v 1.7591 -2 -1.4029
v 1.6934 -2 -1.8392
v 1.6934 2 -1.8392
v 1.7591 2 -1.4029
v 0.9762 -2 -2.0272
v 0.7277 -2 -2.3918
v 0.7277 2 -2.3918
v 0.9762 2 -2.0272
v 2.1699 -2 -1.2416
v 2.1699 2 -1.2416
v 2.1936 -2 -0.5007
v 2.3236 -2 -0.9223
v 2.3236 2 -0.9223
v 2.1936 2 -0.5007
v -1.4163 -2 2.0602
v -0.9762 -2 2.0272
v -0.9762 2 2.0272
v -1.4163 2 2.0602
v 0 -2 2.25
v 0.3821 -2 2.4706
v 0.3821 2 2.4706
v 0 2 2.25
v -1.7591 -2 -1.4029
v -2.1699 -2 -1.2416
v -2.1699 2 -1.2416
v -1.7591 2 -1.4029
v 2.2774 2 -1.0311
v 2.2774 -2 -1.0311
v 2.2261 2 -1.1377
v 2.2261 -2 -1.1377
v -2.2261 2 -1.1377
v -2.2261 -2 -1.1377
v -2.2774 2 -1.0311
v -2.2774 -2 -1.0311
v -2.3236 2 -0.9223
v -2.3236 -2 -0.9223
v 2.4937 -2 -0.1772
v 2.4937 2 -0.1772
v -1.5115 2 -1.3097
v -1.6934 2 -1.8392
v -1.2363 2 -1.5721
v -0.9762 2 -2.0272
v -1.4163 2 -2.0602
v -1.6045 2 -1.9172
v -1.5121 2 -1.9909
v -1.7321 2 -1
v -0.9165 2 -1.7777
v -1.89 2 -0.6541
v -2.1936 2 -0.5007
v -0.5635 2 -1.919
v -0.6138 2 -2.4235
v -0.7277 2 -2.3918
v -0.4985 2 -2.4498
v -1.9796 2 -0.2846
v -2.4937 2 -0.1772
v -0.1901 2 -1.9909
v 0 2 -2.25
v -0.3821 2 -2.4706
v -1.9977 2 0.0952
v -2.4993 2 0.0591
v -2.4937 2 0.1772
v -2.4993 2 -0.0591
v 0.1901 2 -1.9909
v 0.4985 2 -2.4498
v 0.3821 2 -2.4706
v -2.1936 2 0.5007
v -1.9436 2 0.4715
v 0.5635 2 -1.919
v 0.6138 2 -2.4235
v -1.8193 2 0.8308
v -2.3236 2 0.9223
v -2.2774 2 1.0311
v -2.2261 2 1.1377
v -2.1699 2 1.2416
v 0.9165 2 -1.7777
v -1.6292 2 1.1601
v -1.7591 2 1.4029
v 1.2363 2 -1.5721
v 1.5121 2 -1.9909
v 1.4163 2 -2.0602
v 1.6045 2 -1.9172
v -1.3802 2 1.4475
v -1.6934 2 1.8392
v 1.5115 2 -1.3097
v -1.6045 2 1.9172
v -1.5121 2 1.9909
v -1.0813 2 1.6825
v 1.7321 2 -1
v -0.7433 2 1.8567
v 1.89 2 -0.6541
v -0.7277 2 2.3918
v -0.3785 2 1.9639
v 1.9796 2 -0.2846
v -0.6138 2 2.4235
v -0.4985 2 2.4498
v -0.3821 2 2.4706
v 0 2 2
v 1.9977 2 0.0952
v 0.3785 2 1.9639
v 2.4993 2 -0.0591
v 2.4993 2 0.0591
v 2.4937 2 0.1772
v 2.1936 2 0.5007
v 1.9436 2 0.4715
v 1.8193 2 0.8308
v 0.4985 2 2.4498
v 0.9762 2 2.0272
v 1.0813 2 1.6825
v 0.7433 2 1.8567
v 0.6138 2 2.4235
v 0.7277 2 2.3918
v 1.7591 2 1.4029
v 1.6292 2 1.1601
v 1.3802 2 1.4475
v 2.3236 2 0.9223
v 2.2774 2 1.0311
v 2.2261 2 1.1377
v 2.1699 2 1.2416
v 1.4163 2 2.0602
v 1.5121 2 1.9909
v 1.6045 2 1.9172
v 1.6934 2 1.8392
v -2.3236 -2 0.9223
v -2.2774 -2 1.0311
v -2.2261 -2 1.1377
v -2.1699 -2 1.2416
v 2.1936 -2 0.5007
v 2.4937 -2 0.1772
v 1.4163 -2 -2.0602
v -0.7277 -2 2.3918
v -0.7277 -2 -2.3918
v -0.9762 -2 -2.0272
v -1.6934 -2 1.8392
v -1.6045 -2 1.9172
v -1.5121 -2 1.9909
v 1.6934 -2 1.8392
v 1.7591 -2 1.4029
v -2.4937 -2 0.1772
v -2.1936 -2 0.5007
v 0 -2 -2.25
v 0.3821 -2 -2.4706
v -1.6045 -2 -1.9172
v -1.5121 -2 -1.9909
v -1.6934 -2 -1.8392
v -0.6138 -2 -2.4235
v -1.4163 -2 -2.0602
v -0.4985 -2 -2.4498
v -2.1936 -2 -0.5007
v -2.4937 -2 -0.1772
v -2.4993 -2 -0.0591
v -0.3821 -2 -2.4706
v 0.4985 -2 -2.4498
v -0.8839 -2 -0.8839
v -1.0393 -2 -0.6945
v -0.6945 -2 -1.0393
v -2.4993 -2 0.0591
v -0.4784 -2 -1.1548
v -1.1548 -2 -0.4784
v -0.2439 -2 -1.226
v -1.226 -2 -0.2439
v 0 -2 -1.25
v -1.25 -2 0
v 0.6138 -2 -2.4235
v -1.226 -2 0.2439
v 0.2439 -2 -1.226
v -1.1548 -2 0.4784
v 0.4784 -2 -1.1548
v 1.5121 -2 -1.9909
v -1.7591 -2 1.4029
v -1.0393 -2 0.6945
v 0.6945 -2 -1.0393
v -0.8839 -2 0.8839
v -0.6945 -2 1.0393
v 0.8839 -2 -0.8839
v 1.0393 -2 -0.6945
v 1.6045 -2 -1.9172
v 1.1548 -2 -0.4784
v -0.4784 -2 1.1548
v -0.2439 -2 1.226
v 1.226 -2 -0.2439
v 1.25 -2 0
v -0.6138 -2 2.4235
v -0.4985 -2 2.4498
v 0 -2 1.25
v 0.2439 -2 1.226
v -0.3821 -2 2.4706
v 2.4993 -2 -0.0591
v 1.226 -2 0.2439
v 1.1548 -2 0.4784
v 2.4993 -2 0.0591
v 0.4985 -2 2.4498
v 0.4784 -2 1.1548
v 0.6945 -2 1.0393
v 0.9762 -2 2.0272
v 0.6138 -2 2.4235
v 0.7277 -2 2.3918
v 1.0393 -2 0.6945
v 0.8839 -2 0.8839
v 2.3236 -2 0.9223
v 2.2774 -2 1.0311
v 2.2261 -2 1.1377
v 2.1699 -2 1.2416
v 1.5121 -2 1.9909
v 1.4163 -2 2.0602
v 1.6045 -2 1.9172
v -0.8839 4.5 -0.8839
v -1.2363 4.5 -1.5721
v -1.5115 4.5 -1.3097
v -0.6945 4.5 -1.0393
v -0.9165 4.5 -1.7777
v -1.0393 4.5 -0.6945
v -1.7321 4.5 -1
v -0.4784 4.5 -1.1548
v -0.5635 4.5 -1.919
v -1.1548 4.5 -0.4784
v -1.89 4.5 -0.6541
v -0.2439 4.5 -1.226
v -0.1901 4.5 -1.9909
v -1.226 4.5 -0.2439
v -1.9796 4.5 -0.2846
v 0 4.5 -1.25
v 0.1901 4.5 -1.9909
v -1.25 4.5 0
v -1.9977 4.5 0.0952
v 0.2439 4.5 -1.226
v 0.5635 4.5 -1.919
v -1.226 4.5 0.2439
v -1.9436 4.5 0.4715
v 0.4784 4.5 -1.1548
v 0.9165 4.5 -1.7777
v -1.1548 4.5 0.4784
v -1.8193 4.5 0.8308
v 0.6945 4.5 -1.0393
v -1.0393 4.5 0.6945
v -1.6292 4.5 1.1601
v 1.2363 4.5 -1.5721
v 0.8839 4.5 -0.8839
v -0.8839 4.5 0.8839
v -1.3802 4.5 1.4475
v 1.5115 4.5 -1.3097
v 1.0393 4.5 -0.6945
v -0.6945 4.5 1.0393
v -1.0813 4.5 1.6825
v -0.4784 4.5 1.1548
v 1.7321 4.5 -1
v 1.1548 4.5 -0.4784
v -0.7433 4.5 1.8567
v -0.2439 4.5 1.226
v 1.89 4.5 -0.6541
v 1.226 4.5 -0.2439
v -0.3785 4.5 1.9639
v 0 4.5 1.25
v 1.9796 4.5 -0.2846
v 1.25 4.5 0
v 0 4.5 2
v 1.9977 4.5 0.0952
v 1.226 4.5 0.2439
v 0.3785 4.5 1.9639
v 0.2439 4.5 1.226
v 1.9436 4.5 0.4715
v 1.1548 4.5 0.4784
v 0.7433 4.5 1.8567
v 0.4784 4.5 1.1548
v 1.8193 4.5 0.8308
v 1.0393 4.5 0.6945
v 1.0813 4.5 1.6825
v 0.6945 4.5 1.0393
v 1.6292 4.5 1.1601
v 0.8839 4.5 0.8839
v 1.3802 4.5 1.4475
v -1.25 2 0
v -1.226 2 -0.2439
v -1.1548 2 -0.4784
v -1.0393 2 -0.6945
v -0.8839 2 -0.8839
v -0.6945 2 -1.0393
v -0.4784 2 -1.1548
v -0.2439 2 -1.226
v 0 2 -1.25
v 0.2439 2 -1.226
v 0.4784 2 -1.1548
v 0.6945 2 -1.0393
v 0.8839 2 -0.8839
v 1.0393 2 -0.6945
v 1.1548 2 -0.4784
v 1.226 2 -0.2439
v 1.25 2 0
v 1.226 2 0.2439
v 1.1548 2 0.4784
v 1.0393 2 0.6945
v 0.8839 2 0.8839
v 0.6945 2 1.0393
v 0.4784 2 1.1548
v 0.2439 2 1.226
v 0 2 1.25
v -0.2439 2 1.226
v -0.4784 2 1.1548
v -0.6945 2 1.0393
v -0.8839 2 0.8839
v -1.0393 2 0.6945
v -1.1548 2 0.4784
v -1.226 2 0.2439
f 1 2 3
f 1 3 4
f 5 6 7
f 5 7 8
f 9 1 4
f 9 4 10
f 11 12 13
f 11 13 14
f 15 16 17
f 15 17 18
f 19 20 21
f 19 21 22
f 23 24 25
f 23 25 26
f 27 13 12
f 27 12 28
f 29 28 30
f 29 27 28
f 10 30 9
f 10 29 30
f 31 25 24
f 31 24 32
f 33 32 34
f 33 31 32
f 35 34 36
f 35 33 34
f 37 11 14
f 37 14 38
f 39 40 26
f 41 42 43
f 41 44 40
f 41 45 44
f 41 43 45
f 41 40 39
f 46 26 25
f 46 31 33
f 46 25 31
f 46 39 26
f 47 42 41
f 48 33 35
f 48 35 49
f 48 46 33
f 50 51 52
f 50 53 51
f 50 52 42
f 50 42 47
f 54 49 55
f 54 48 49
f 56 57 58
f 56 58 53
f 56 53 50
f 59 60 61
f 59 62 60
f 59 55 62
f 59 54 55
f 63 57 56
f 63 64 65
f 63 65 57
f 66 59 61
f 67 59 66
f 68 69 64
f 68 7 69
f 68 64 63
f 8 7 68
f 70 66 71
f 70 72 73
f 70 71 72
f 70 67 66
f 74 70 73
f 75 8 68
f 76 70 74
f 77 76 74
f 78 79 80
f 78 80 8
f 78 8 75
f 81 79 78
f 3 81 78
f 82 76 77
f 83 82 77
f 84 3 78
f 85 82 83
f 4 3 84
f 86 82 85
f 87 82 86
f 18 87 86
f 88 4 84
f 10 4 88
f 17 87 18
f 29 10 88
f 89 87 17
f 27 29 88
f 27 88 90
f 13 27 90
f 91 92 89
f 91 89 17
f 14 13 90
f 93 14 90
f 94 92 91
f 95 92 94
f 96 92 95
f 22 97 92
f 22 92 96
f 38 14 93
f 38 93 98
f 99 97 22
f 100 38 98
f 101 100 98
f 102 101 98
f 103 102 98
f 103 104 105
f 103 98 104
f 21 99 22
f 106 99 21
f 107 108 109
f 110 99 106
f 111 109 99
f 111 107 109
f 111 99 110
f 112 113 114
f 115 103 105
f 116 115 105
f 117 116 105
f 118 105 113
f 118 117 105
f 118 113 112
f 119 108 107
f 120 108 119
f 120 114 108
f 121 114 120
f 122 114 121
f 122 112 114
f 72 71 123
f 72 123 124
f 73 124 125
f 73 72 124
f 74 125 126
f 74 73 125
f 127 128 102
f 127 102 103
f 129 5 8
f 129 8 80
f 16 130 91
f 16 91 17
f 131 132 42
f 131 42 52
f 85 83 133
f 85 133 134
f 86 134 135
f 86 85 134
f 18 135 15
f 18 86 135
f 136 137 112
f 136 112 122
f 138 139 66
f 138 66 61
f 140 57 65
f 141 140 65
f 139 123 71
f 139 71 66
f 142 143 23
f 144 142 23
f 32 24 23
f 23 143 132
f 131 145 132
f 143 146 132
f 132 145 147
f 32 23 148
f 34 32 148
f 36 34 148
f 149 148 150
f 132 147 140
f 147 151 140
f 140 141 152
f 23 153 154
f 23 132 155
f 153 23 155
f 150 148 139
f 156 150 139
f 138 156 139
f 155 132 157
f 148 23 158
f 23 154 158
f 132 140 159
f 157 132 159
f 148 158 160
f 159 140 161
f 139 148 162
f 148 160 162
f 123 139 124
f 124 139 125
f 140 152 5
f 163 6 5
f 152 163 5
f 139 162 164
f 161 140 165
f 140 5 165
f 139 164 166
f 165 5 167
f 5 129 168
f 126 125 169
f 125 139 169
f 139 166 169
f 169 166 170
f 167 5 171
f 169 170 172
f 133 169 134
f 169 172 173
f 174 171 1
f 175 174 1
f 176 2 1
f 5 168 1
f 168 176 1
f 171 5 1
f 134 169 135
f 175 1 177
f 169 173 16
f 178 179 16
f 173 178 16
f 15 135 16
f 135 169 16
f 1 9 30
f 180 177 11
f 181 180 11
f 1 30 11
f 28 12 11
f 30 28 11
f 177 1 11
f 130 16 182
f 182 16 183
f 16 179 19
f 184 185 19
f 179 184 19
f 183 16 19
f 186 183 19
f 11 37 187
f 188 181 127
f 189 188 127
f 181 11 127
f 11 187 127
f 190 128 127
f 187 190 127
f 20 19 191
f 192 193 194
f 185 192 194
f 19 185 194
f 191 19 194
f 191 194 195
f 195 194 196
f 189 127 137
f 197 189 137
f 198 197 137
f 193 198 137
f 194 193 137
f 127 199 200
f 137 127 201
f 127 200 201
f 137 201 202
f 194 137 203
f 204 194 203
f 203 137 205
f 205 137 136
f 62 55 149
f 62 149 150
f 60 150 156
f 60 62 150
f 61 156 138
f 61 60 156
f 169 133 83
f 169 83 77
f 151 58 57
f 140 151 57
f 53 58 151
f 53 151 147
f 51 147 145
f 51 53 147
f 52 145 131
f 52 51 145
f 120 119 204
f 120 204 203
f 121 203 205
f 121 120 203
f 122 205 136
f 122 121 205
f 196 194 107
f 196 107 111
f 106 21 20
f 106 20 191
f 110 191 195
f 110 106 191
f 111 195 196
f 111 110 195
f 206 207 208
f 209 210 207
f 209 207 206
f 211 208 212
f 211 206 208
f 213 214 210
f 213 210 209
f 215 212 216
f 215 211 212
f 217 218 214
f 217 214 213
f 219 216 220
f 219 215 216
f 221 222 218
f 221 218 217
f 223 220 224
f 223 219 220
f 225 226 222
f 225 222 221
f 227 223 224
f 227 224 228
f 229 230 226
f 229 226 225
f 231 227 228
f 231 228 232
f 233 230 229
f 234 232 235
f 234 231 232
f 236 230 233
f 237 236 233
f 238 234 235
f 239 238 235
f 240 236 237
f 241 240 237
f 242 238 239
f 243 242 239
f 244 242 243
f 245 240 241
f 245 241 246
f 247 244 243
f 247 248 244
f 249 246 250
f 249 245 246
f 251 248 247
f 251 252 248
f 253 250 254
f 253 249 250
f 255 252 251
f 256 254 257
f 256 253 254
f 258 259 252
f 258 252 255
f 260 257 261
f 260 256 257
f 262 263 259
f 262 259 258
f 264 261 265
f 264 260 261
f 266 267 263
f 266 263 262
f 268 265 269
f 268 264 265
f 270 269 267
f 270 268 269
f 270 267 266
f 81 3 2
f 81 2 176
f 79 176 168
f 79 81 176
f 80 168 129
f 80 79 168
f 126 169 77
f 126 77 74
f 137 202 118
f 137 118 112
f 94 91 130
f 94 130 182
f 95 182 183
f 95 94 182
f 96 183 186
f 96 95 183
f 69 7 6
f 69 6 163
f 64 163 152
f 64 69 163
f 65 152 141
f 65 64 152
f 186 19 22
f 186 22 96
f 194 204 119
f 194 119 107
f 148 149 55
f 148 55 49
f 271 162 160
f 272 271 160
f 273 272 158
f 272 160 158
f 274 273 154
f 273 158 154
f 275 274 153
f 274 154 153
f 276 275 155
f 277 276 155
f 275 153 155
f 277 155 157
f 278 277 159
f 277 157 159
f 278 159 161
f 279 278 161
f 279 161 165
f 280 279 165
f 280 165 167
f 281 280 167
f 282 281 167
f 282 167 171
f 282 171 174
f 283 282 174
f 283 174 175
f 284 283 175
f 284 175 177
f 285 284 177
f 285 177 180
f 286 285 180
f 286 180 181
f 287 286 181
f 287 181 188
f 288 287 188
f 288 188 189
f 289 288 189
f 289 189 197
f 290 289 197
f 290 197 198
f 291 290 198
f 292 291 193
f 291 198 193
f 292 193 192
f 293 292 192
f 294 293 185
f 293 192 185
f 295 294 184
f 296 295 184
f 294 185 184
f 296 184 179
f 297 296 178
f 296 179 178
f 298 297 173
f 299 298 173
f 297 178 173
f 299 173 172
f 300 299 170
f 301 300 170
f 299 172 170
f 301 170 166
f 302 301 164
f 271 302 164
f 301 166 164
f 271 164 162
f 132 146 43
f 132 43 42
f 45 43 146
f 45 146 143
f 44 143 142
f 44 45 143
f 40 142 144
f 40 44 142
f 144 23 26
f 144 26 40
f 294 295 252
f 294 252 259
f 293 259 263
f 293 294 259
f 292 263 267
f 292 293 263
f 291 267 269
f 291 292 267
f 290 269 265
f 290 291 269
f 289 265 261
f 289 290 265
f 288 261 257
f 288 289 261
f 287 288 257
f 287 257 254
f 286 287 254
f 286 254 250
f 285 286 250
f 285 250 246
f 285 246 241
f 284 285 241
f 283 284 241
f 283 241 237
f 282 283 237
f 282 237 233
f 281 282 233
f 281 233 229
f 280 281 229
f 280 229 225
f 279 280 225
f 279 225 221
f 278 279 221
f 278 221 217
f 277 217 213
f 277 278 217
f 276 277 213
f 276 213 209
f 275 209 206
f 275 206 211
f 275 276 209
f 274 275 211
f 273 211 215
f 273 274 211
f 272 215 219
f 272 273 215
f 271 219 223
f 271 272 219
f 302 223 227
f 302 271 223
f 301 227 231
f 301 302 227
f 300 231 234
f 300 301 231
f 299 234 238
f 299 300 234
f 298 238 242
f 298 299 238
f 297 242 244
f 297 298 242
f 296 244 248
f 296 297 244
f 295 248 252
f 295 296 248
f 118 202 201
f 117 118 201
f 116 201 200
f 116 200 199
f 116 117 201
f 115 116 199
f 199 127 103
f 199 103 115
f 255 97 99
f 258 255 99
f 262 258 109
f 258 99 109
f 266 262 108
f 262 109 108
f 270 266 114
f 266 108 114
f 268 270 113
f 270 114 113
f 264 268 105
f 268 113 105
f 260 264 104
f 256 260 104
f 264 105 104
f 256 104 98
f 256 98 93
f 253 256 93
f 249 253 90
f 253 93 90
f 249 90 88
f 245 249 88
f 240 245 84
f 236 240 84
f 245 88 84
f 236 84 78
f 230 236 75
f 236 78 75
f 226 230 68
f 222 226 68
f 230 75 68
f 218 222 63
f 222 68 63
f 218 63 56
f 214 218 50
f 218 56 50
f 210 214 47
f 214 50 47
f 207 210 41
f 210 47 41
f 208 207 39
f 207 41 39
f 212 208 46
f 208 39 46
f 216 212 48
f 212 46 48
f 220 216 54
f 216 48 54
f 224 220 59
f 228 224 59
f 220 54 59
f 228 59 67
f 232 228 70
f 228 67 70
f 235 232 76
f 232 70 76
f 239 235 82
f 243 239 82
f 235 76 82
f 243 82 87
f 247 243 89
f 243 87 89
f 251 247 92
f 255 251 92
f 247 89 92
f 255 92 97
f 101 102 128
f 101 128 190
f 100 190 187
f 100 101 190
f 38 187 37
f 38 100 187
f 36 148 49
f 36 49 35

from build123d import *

# Parameters (mm, degrees)
MAINBODYS_R           = 2.5
MAIN_BODY_DEPTH       = 2
M3X0_5_TAPPED_HOLE1_D = 2.5
GROOVED_CUT_DEPTH     = 6.338539126
GC_START              = -2
GC_CP_DEPTH           = 4
PRESSFITBODYS_R       = 2
PRESSFITBODYS_R_2     = 1.25
PRESS_FIT_BODY_DEPTH  = 2.5


# Read off the part's stored shape, not the designer's step: GC CP
with BuildPart() as part:
    # MainBodyS → MAIN BODY (new, symmetric)
    with BuildSketch(Plane(origin=(0, 0, 0), x_dir=(1, 0, 0), z_dir=(0, 1, 0))):
        with Locations(Location((0, 0, 0), (0, 0, 270))):
            Circle(MAINBODYS_R)
    extrude(amount=MAIN_BODY_DEPTH, both=True)

    # M3x0.5 Tapped Hole1 (through all)
    with Locations(Plane(origin=(0, 2, 0), x_dir=(1, 0, 0), z_dir=(0, 1, 0))):
        with Locations((0, 0)):
            Hole(M3X0_5_TAPPED_HOLE1_D / 2)

    # GroovedCutS → GROOVED CUT (cut, through all)
    with BuildSketch(Plane(origin=(0, 2, 0), x_dir=(1, 0, 0), z_dir=(0, 1, 0))):
        with BuildLine():
            Line((0, 2.25), (0.382129822, 2.470622755))
            ThreePointArc((0.382129822, 2.470622755), (0, 2.5), (-0.382129822, 2.470622755))
            Line((-0.382129822, 2.470622755), (0, 2.25))
        make_face()
    extrude(amount=-GROOVED_CUT_DEPTH, mode=Mode.SUBTRACT)

    # GC CP outline → GC CP (cut)
    with BuildSketch(Plane(origin=(0, 0, 0), x_dir=(1, 0, 0), z_dir=(0, 1, 0)).offset(GC_START)):
        with BuildLine():
            ThreePointArc((-0.727675966, 2.391754103), (-1.084709348, 2.25242217), (-1.416250112, 2.060154271))
            Line((-1.416250112, 2.060154271), (-0.976238413, 2.027179953))
            Line((-0.976238413, 2.027179953), (-0.727675966, 2.391754103))
        make_face()
        with BuildLine():
            Line((0.976238413, 2.027179953), (1.416250112, 2.060154271))
            ThreePointArc((1.416250112, 2.060154271), (1.084709348, 2.25242217), (0.727675966, 2.391754103))
            Line((0.727675966, 2.391754103), (0.976238413, 2.027179953))
        make_face()
        with BuildLine():
            Line((1.759120836, 1.402852054), (2.169864698, 1.241646967))
            ThreePointArc((2.169864698, 1.241646967), (1.954578706, 1.558724504), (1.693356605, 1.839169217))
            Line((1.693356605, 1.839169217), (1.759120836, 1.402852054))
        make_face()
        with BuildLine():
            Line((2.193587802, 0.500672101), (2.493710969, 0.177216254))
            ThreePointArc((2.493710969, 0.177216254), (2.43731978, 0.556302335), (2.3236472, 0.922314312))
            Line((2.3236472, 0.922314312), (2.193587802, 0.500672101))
        make_face()
        with BuildLine():
            Line((2.193587802, -0.500672101), (2.3236472, -0.922314312))
            ThreePointArc((2.3236472, -0.922314312), (2.43731978, -0.556302335), (2.493710969, -0.177216254))
            Line((2.493710969, -0.177216254), (2.193587802, -0.500672101))
        make_face()
        with BuildLine():
            Line((1.759120836, -1.402852054), (1.693356605, -1.839169217))
            ThreePointArc((1.693356605, -1.839169217), (1.954578706, -1.558724504), (2.169864698, -1.241646967))
            Line((2.169864698, -1.241646967), (1.759120836, -1.402852054))
        make_face()
        with BuildLine():
            Line((0.976238413, -2.027179953), (0.727675966, -2.391754103))
            ThreePointArc((0.727675966, -2.391754103), (1.084709348, -2.25242217), (1.416250112, -2.060154271))
            Line((1.416250112, -2.060154271), (0.976238413, -2.027179953))
        make_face()
        with BuildLine():
            Line((0, -2.25), (-0.382129822, -2.470622755))
            ThreePointArc((-0.382129822, -2.470622755), (0, -2.5), (0.382129822, -2.470622755))
            Line((0.382129822, -2.470622755), (0, -2.25))
        make_face()
        with BuildLine():
            Line((-0.976238413, -2.027179953), (-1.416250112, -2.060154271))
            ThreePointArc((-1.416250112, -2.060154271), (-1.084709348, -2.25242217), (-0.727675966, -2.391754103))
            Line((-0.727675966, -2.391754103), (-0.976238413, -2.027179953))
        make_face()
        with BuildLine():
            Line((-1.759120836, -1.402852054), (-2.169864698, -1.241646967))
            ThreePointArc((-2.169864698, -1.241646967), (-1.954578706, -1.558724504), (-1.693356605, -1.839169217))
            Line((-1.693356605, -1.839169217), (-1.759120836, -1.402852054))
        make_face()
        with BuildLine():
            Line((-2.193587802, -0.500672101), (-2.493710969, -0.177216254))
            ThreePointArc((-2.493710969, -0.177216254), (-2.43731978, -0.556302335), (-2.3236472, -0.922314312))
            Line((-2.3236472, -0.922314312), (-2.193587802, -0.500672101))
        make_face()
        with BuildLine():
            Line((-2.193587802, 0.500672101), (-2.3236472, 0.922314312))
            ThreePointArc((-2.3236472, 0.922314312), (-2.43731978, 0.556302335), (-2.493710969, 0.177216254))
            Line((-2.493710969, 0.177216254), (-2.193587802, 0.500672101))
        make_face()
        with BuildLine():
            Line((-1.759120836, 1.402852054), (-1.693356605, 1.839169217))
            ThreePointArc((-1.693356605, 1.839169217), (-1.954578706, 1.558724504), (-2.169864698, 1.241646967))
            Line((-2.169864698, 1.241646967), (-1.759120836, 1.402852054))
        make_face()
    extrude(amount=GC_CP_DEPTH, mode=Mode.SUBTRACT)

    # PressFitBodyS → PRESS FIT BODY (add)
    with BuildSketch(Plane(origin=(0, 2, 0), x_dir=(1, 0, 0), z_dir=(0, 1, 0))):
        with Locations(Location((0, 0, 0), (0, 0, 270))):
            Circle(PRESSFITBODYS_R)
        with Locations(Location((0, 0, 0), (0, 0, 270))):
            Circle(PRESSFITBODYS_R_2, mode=Mode.SUBTRACT)
    extrude(amount=PRESS_FIT_BODY_DEPTH)


solid = part.part
